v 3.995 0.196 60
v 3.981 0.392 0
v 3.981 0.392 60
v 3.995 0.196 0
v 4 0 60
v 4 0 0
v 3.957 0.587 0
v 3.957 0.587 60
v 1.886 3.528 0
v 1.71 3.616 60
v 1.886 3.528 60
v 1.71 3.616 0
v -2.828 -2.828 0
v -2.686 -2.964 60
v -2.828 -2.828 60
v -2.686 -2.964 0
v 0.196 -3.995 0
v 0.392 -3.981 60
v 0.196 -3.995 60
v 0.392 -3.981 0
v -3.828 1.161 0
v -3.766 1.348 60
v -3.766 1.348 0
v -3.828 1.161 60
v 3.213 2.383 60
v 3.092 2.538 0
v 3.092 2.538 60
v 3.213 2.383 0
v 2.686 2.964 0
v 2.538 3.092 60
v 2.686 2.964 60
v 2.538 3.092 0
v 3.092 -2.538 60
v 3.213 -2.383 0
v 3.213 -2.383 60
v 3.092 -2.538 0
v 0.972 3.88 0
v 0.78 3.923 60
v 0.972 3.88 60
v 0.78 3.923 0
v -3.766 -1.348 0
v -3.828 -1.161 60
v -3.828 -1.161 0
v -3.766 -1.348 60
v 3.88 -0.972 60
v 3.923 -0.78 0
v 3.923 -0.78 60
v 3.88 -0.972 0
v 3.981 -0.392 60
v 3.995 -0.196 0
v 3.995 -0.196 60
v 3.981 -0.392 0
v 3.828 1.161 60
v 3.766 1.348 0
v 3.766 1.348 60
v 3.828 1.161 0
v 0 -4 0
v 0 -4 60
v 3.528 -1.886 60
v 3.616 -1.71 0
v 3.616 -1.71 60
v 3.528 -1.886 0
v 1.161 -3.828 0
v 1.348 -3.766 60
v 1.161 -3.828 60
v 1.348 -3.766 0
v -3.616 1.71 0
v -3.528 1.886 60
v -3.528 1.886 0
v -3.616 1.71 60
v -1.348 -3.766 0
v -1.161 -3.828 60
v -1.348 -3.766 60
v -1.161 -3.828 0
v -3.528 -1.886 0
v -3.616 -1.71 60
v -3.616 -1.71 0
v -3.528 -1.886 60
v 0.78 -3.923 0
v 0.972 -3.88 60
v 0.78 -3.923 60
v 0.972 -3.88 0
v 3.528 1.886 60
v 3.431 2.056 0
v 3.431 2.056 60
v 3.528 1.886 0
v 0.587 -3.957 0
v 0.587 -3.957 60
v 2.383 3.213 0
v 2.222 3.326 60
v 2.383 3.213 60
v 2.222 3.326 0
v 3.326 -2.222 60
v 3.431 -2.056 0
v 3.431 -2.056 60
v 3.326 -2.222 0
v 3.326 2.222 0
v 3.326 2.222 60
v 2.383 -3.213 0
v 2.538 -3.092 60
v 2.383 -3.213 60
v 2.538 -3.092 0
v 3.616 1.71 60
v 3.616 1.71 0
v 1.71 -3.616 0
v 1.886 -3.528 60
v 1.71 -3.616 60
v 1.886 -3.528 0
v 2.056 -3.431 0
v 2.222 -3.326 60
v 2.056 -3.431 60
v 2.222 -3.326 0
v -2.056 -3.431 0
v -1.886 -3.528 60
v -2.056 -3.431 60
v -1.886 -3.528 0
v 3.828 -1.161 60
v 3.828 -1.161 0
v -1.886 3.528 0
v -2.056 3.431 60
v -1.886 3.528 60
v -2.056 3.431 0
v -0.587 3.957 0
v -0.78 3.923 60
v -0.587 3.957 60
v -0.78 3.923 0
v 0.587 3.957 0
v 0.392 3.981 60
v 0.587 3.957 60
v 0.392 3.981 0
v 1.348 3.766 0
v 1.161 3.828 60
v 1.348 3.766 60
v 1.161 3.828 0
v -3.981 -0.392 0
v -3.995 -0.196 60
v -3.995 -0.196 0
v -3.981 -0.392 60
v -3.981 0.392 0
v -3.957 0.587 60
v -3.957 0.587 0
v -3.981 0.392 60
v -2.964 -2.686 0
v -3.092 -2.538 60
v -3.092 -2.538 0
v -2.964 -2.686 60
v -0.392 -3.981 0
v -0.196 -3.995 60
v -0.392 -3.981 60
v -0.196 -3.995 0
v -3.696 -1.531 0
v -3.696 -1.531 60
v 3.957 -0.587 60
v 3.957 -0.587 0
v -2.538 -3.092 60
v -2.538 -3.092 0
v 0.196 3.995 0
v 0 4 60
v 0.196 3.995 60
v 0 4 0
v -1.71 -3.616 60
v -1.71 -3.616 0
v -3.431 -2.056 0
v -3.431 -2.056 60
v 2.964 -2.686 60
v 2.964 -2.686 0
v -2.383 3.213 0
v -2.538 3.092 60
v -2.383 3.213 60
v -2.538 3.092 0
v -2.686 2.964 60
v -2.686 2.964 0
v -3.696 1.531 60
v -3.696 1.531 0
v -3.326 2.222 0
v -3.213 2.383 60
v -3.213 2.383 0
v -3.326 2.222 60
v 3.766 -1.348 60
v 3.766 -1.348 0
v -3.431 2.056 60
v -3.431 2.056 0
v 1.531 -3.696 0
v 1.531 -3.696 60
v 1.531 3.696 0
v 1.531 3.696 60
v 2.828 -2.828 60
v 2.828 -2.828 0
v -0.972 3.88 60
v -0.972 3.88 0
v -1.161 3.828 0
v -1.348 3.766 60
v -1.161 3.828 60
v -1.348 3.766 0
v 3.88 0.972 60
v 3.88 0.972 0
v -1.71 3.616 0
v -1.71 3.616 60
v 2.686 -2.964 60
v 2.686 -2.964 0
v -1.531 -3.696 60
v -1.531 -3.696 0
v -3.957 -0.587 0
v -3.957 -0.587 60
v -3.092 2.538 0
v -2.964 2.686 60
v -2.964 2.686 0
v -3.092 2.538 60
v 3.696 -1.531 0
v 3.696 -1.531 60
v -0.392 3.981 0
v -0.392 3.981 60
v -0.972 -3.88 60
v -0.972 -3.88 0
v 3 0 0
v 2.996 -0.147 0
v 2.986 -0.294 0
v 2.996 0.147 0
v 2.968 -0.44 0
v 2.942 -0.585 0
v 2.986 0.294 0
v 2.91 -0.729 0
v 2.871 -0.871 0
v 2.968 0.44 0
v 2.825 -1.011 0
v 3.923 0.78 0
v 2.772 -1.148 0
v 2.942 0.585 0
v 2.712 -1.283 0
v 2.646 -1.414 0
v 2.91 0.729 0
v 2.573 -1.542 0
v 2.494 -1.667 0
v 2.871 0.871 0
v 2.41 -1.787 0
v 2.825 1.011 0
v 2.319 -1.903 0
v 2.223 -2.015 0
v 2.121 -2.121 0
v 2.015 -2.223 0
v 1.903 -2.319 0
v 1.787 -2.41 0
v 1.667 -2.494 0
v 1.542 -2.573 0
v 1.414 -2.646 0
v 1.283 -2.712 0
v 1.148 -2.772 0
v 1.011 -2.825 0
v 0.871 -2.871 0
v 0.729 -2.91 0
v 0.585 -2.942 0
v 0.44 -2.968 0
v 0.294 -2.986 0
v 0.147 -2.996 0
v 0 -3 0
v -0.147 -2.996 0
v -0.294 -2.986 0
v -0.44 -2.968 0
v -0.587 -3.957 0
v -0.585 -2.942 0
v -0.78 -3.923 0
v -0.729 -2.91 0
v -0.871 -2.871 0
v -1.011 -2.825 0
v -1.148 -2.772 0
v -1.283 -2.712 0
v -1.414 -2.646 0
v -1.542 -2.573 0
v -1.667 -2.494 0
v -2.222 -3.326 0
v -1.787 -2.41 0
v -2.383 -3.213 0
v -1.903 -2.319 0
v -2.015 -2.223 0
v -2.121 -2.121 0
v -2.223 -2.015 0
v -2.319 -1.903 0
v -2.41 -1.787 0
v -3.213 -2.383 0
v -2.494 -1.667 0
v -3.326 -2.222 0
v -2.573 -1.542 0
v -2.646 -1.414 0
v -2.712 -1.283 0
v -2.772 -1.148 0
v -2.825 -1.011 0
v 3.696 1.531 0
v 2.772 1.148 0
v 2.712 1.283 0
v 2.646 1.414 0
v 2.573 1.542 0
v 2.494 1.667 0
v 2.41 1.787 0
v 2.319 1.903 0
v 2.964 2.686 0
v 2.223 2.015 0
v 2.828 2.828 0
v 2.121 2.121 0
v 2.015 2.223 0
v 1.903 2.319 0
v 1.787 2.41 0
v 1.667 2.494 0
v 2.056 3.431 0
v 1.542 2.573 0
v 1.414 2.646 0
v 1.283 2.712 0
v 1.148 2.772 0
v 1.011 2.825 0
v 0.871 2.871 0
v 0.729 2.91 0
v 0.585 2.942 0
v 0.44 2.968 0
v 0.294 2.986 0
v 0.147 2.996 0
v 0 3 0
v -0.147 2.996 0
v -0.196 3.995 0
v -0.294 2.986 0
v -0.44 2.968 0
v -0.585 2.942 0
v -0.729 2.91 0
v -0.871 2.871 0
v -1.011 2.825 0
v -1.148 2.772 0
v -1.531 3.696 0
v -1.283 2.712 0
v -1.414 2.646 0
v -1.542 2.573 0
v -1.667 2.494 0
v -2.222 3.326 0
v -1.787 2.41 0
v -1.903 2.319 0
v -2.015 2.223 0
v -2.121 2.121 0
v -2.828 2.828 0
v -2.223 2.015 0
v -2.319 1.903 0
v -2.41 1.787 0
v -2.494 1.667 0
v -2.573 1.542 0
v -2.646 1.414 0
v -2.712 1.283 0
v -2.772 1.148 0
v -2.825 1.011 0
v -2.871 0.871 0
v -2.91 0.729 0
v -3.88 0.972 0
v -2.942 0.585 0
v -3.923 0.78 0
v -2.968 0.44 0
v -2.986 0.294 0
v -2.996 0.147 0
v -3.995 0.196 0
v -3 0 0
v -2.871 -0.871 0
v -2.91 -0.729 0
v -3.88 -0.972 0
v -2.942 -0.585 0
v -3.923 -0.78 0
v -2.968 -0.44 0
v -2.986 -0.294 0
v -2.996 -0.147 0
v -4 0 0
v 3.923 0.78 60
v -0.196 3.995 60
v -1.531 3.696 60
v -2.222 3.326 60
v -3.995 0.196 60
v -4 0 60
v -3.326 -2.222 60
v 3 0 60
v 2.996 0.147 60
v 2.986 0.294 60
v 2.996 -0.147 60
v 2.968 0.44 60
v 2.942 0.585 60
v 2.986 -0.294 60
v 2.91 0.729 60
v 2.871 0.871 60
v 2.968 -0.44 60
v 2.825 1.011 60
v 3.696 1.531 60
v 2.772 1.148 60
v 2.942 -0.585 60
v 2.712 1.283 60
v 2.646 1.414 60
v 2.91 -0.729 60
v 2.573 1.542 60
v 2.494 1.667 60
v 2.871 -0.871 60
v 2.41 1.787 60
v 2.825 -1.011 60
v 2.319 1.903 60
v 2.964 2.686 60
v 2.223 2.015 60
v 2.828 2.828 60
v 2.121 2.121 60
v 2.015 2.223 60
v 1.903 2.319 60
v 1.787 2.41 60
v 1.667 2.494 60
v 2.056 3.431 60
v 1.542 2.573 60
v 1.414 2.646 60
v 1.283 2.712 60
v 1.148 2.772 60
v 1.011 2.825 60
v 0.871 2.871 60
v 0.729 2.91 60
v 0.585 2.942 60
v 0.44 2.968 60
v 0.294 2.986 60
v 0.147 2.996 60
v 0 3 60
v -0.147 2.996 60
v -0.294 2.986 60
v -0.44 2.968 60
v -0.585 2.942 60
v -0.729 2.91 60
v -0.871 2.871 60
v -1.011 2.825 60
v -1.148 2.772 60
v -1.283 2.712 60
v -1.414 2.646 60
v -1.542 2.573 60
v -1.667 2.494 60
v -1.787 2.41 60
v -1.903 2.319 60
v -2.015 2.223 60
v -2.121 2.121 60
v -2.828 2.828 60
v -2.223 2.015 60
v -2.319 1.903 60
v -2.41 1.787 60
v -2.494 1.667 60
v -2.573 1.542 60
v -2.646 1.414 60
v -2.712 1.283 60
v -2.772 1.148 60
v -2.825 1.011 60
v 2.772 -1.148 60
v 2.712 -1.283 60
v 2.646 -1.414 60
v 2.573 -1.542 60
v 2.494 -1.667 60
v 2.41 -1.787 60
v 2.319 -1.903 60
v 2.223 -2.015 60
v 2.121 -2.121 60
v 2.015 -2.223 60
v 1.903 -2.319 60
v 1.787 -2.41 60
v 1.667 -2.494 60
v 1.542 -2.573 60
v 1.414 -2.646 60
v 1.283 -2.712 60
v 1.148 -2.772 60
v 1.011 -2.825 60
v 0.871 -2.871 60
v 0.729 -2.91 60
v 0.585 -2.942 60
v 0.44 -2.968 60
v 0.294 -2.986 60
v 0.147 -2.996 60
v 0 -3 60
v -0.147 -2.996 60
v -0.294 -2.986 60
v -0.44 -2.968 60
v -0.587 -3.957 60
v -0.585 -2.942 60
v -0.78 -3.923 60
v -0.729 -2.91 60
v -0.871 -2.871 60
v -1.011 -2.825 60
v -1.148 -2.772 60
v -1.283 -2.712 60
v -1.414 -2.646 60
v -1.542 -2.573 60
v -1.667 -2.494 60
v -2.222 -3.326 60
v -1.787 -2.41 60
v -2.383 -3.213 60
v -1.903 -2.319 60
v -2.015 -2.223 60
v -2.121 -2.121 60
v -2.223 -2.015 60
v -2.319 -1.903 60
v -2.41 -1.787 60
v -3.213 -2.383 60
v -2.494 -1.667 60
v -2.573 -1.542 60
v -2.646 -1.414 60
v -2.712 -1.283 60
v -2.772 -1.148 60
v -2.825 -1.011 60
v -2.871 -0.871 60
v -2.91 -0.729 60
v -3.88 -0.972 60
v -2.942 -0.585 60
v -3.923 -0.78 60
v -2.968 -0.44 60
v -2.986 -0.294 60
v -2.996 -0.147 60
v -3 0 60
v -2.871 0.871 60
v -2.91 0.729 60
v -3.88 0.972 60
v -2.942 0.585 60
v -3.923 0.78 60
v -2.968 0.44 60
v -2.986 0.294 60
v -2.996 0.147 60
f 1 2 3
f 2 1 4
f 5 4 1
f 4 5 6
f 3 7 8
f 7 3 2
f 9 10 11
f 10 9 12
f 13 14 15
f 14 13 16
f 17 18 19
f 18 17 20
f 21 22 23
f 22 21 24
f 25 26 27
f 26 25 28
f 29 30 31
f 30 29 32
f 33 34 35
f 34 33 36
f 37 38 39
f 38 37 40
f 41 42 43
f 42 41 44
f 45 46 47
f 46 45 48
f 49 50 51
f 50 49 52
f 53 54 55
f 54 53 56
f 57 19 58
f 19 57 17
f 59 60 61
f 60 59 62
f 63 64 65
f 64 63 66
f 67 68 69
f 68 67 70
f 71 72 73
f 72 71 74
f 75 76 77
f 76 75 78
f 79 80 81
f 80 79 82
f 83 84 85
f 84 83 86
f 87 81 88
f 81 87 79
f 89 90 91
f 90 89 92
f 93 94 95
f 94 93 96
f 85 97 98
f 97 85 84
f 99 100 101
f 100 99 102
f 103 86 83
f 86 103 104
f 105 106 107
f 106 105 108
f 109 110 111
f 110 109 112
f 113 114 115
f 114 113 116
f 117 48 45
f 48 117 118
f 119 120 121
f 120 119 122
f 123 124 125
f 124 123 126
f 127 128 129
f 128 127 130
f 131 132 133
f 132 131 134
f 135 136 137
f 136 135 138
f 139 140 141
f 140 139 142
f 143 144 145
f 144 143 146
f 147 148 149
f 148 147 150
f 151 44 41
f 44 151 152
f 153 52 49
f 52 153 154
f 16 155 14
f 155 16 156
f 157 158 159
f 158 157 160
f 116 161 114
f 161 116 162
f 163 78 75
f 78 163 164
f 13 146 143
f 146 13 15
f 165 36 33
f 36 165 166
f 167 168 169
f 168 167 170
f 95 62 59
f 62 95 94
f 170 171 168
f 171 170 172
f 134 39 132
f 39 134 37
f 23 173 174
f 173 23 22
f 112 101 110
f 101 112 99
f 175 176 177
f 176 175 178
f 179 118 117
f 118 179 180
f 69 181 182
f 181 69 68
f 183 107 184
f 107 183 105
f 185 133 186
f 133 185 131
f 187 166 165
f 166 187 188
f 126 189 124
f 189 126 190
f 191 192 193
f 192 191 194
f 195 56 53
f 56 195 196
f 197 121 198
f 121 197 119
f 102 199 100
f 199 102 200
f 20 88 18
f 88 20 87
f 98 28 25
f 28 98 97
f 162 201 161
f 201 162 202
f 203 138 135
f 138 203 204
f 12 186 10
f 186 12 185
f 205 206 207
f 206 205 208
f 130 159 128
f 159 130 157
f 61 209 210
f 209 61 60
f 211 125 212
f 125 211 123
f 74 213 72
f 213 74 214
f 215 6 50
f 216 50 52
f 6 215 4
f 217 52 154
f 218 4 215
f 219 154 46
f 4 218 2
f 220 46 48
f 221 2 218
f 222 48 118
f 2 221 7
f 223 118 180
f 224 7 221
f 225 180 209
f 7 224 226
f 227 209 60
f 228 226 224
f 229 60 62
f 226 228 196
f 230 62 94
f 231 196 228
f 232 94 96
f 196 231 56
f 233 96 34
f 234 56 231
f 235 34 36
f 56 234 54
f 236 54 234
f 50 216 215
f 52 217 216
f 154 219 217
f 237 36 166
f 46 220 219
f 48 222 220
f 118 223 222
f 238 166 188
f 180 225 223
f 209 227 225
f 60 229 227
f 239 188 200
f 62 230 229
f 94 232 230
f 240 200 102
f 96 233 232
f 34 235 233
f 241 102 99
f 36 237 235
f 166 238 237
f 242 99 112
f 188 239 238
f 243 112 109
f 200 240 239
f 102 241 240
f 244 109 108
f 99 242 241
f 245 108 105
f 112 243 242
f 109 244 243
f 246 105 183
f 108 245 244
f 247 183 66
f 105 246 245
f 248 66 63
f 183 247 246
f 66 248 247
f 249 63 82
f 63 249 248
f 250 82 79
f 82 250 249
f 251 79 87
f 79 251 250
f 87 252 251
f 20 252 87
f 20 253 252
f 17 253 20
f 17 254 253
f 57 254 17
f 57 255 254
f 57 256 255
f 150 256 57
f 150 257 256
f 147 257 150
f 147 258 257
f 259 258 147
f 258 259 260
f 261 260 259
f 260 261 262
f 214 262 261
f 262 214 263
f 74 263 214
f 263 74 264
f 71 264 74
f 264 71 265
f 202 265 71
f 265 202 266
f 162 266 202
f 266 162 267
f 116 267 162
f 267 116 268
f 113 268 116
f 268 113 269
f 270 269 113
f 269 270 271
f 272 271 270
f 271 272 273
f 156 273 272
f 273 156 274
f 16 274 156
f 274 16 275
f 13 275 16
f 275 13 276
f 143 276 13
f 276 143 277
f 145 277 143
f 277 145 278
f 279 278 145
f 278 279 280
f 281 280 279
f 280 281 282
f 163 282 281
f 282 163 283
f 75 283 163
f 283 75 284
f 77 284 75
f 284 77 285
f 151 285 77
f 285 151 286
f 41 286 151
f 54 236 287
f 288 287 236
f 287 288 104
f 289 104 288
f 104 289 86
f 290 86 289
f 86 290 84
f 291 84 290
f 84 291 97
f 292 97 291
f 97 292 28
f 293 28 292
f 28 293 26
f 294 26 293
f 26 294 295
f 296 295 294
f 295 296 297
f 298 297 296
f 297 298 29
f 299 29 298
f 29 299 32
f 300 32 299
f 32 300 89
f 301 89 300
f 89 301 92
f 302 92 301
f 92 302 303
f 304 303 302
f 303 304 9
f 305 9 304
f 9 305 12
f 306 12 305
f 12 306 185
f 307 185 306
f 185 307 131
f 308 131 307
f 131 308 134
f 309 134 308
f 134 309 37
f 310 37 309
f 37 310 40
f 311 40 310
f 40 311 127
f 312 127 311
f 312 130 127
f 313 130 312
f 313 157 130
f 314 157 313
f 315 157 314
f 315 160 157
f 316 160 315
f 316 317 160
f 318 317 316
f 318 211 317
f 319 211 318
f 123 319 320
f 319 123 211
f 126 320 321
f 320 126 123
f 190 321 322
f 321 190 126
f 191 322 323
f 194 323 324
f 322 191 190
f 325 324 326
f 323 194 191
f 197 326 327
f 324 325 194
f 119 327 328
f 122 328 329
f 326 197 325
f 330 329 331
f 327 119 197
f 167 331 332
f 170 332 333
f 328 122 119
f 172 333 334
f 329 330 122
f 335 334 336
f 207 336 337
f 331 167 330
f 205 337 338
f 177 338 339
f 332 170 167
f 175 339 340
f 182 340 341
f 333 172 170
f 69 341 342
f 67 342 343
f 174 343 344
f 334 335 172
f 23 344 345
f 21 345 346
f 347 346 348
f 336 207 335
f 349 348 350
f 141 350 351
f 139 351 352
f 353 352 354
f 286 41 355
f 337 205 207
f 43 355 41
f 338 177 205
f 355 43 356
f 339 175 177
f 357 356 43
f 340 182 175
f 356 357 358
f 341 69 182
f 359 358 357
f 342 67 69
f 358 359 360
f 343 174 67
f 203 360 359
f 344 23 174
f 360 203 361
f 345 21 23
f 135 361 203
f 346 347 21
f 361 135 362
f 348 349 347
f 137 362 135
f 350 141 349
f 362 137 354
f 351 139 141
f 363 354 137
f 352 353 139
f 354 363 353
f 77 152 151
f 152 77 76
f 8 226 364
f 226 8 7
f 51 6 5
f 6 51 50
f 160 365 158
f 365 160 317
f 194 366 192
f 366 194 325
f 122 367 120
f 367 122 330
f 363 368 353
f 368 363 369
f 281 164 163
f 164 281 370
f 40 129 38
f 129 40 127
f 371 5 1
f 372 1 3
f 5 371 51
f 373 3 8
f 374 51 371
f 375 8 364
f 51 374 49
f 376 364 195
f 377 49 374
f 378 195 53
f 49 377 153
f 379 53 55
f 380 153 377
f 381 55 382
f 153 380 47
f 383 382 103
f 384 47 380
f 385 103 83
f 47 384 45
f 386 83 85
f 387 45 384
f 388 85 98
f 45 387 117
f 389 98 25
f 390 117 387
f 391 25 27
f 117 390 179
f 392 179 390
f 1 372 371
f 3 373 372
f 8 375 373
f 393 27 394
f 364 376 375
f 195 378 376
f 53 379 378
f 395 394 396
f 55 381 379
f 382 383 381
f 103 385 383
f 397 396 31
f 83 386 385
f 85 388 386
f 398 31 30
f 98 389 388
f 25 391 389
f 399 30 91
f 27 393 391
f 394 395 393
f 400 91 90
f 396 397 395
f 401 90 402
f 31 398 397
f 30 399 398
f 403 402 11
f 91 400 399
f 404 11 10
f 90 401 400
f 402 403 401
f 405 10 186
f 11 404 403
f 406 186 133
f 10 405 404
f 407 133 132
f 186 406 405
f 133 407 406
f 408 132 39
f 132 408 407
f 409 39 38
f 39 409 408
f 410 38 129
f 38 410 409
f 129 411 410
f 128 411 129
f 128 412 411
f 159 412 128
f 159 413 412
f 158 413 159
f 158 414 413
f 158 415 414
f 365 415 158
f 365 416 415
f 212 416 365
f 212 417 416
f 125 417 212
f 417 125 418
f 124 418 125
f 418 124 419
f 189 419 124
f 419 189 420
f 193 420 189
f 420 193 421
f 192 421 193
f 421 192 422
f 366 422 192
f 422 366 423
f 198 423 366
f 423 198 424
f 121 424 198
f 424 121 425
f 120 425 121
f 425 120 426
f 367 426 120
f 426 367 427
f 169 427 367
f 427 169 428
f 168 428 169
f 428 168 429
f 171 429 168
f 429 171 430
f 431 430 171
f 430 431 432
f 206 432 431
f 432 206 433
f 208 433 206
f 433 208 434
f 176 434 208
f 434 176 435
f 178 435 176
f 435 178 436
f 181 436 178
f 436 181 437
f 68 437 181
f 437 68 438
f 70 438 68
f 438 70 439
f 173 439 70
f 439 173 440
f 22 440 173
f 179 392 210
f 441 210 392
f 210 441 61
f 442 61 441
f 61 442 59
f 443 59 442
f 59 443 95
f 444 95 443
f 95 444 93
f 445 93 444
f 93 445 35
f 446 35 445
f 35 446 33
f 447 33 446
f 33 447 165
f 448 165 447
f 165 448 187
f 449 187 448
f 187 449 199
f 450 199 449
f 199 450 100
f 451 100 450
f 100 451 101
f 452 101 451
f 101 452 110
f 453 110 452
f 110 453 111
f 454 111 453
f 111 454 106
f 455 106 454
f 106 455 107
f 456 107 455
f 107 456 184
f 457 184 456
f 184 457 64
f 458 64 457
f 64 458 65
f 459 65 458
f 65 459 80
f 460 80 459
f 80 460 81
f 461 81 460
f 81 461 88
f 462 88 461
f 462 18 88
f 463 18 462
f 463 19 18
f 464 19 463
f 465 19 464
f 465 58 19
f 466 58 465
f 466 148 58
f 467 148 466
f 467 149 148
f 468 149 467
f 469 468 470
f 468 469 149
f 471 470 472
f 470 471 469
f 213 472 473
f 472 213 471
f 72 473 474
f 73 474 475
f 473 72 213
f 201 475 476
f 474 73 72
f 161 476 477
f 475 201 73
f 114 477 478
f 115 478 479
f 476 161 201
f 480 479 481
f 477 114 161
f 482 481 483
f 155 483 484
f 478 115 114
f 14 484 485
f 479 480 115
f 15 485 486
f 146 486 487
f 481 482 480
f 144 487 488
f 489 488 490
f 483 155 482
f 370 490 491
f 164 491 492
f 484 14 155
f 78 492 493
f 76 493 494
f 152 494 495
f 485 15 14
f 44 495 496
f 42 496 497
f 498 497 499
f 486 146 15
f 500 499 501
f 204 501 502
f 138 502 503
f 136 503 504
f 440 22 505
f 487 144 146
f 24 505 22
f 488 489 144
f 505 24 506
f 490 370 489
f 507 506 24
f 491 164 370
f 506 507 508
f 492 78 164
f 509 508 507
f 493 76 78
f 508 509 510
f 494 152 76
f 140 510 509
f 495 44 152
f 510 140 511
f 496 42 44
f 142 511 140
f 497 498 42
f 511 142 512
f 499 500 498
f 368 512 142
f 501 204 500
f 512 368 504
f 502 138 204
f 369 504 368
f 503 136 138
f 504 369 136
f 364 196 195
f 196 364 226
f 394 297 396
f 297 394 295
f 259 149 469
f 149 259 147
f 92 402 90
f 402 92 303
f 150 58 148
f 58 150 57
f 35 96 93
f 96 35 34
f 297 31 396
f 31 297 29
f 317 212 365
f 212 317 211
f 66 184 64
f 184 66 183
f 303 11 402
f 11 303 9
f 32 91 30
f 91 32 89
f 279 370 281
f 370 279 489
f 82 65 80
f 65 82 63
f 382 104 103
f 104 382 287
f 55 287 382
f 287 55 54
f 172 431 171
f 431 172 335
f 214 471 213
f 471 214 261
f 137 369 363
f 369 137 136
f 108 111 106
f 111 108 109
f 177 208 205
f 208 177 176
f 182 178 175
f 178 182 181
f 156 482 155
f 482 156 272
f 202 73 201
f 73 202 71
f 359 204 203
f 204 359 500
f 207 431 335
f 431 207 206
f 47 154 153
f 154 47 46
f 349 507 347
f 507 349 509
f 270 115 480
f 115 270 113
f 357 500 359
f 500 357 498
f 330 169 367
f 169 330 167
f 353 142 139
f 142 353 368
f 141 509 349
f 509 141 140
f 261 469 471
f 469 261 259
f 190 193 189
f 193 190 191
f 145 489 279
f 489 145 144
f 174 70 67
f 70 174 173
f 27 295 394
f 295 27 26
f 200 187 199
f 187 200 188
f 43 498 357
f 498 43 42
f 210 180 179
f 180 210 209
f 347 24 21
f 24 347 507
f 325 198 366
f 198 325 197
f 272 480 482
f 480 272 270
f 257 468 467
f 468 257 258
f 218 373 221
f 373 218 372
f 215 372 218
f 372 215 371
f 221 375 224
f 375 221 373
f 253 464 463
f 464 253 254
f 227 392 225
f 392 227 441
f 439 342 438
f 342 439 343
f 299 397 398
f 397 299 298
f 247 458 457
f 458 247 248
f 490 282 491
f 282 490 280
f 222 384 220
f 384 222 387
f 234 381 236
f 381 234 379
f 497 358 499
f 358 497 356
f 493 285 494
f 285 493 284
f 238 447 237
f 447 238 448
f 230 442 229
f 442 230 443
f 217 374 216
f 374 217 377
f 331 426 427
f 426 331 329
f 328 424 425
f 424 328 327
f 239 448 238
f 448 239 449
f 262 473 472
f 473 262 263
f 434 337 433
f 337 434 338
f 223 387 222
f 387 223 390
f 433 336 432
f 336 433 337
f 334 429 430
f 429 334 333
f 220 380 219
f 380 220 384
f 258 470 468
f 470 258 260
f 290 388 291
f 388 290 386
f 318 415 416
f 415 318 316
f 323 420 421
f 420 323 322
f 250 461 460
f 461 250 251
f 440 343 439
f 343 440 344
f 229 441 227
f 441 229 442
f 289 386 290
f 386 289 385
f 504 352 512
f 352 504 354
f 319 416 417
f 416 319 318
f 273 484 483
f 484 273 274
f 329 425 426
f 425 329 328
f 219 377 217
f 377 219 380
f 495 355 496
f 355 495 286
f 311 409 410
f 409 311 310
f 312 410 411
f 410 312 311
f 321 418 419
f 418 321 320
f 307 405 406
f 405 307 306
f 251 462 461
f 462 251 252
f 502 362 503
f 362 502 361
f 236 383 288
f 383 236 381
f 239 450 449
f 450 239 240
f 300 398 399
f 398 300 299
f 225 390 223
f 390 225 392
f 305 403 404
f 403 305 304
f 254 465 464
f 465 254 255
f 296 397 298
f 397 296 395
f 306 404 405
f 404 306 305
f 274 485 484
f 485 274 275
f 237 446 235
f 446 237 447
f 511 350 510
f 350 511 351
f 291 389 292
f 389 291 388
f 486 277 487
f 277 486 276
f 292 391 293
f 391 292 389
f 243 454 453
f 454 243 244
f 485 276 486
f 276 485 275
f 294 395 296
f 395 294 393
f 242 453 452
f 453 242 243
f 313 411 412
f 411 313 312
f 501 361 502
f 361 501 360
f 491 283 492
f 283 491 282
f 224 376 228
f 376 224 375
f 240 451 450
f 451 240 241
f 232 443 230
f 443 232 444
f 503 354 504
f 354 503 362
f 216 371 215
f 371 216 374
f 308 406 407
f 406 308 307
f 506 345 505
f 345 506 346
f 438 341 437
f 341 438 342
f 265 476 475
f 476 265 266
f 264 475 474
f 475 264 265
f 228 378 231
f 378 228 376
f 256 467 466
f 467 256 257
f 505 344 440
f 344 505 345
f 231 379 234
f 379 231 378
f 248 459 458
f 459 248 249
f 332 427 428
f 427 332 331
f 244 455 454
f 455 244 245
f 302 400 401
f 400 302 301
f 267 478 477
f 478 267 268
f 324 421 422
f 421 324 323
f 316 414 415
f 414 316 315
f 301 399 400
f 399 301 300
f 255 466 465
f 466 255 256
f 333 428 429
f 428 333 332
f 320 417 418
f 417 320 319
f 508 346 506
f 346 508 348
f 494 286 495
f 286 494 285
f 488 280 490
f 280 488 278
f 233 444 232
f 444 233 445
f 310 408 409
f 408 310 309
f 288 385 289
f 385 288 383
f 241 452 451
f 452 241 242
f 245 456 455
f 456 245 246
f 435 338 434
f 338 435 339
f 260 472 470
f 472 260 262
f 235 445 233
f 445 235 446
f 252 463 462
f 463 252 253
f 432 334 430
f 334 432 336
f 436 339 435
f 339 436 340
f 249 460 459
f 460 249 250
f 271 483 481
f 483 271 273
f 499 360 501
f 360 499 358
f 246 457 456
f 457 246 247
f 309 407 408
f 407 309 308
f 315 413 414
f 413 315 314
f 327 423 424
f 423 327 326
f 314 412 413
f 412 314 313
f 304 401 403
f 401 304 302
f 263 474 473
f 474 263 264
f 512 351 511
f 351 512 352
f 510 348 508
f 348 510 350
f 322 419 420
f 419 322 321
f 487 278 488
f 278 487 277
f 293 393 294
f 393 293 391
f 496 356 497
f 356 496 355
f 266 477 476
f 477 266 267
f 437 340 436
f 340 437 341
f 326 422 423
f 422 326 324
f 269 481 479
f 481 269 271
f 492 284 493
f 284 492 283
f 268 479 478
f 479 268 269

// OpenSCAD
$fn = 128;

// Heatshrink sleeving (tubing)
inner_d = 6;          // inner diameter (mm)
wall = 1;             // wall thickness (mm)
length = 60;          // length (mm)

outer_d = inner_d + 2*wall;

difference() {
  cylinder(h = length, d = outer_d, center = false);
  translate([0,0,-0.1])
    cylinder(h = length + 0.2, d = inner_d, center = false);
}
